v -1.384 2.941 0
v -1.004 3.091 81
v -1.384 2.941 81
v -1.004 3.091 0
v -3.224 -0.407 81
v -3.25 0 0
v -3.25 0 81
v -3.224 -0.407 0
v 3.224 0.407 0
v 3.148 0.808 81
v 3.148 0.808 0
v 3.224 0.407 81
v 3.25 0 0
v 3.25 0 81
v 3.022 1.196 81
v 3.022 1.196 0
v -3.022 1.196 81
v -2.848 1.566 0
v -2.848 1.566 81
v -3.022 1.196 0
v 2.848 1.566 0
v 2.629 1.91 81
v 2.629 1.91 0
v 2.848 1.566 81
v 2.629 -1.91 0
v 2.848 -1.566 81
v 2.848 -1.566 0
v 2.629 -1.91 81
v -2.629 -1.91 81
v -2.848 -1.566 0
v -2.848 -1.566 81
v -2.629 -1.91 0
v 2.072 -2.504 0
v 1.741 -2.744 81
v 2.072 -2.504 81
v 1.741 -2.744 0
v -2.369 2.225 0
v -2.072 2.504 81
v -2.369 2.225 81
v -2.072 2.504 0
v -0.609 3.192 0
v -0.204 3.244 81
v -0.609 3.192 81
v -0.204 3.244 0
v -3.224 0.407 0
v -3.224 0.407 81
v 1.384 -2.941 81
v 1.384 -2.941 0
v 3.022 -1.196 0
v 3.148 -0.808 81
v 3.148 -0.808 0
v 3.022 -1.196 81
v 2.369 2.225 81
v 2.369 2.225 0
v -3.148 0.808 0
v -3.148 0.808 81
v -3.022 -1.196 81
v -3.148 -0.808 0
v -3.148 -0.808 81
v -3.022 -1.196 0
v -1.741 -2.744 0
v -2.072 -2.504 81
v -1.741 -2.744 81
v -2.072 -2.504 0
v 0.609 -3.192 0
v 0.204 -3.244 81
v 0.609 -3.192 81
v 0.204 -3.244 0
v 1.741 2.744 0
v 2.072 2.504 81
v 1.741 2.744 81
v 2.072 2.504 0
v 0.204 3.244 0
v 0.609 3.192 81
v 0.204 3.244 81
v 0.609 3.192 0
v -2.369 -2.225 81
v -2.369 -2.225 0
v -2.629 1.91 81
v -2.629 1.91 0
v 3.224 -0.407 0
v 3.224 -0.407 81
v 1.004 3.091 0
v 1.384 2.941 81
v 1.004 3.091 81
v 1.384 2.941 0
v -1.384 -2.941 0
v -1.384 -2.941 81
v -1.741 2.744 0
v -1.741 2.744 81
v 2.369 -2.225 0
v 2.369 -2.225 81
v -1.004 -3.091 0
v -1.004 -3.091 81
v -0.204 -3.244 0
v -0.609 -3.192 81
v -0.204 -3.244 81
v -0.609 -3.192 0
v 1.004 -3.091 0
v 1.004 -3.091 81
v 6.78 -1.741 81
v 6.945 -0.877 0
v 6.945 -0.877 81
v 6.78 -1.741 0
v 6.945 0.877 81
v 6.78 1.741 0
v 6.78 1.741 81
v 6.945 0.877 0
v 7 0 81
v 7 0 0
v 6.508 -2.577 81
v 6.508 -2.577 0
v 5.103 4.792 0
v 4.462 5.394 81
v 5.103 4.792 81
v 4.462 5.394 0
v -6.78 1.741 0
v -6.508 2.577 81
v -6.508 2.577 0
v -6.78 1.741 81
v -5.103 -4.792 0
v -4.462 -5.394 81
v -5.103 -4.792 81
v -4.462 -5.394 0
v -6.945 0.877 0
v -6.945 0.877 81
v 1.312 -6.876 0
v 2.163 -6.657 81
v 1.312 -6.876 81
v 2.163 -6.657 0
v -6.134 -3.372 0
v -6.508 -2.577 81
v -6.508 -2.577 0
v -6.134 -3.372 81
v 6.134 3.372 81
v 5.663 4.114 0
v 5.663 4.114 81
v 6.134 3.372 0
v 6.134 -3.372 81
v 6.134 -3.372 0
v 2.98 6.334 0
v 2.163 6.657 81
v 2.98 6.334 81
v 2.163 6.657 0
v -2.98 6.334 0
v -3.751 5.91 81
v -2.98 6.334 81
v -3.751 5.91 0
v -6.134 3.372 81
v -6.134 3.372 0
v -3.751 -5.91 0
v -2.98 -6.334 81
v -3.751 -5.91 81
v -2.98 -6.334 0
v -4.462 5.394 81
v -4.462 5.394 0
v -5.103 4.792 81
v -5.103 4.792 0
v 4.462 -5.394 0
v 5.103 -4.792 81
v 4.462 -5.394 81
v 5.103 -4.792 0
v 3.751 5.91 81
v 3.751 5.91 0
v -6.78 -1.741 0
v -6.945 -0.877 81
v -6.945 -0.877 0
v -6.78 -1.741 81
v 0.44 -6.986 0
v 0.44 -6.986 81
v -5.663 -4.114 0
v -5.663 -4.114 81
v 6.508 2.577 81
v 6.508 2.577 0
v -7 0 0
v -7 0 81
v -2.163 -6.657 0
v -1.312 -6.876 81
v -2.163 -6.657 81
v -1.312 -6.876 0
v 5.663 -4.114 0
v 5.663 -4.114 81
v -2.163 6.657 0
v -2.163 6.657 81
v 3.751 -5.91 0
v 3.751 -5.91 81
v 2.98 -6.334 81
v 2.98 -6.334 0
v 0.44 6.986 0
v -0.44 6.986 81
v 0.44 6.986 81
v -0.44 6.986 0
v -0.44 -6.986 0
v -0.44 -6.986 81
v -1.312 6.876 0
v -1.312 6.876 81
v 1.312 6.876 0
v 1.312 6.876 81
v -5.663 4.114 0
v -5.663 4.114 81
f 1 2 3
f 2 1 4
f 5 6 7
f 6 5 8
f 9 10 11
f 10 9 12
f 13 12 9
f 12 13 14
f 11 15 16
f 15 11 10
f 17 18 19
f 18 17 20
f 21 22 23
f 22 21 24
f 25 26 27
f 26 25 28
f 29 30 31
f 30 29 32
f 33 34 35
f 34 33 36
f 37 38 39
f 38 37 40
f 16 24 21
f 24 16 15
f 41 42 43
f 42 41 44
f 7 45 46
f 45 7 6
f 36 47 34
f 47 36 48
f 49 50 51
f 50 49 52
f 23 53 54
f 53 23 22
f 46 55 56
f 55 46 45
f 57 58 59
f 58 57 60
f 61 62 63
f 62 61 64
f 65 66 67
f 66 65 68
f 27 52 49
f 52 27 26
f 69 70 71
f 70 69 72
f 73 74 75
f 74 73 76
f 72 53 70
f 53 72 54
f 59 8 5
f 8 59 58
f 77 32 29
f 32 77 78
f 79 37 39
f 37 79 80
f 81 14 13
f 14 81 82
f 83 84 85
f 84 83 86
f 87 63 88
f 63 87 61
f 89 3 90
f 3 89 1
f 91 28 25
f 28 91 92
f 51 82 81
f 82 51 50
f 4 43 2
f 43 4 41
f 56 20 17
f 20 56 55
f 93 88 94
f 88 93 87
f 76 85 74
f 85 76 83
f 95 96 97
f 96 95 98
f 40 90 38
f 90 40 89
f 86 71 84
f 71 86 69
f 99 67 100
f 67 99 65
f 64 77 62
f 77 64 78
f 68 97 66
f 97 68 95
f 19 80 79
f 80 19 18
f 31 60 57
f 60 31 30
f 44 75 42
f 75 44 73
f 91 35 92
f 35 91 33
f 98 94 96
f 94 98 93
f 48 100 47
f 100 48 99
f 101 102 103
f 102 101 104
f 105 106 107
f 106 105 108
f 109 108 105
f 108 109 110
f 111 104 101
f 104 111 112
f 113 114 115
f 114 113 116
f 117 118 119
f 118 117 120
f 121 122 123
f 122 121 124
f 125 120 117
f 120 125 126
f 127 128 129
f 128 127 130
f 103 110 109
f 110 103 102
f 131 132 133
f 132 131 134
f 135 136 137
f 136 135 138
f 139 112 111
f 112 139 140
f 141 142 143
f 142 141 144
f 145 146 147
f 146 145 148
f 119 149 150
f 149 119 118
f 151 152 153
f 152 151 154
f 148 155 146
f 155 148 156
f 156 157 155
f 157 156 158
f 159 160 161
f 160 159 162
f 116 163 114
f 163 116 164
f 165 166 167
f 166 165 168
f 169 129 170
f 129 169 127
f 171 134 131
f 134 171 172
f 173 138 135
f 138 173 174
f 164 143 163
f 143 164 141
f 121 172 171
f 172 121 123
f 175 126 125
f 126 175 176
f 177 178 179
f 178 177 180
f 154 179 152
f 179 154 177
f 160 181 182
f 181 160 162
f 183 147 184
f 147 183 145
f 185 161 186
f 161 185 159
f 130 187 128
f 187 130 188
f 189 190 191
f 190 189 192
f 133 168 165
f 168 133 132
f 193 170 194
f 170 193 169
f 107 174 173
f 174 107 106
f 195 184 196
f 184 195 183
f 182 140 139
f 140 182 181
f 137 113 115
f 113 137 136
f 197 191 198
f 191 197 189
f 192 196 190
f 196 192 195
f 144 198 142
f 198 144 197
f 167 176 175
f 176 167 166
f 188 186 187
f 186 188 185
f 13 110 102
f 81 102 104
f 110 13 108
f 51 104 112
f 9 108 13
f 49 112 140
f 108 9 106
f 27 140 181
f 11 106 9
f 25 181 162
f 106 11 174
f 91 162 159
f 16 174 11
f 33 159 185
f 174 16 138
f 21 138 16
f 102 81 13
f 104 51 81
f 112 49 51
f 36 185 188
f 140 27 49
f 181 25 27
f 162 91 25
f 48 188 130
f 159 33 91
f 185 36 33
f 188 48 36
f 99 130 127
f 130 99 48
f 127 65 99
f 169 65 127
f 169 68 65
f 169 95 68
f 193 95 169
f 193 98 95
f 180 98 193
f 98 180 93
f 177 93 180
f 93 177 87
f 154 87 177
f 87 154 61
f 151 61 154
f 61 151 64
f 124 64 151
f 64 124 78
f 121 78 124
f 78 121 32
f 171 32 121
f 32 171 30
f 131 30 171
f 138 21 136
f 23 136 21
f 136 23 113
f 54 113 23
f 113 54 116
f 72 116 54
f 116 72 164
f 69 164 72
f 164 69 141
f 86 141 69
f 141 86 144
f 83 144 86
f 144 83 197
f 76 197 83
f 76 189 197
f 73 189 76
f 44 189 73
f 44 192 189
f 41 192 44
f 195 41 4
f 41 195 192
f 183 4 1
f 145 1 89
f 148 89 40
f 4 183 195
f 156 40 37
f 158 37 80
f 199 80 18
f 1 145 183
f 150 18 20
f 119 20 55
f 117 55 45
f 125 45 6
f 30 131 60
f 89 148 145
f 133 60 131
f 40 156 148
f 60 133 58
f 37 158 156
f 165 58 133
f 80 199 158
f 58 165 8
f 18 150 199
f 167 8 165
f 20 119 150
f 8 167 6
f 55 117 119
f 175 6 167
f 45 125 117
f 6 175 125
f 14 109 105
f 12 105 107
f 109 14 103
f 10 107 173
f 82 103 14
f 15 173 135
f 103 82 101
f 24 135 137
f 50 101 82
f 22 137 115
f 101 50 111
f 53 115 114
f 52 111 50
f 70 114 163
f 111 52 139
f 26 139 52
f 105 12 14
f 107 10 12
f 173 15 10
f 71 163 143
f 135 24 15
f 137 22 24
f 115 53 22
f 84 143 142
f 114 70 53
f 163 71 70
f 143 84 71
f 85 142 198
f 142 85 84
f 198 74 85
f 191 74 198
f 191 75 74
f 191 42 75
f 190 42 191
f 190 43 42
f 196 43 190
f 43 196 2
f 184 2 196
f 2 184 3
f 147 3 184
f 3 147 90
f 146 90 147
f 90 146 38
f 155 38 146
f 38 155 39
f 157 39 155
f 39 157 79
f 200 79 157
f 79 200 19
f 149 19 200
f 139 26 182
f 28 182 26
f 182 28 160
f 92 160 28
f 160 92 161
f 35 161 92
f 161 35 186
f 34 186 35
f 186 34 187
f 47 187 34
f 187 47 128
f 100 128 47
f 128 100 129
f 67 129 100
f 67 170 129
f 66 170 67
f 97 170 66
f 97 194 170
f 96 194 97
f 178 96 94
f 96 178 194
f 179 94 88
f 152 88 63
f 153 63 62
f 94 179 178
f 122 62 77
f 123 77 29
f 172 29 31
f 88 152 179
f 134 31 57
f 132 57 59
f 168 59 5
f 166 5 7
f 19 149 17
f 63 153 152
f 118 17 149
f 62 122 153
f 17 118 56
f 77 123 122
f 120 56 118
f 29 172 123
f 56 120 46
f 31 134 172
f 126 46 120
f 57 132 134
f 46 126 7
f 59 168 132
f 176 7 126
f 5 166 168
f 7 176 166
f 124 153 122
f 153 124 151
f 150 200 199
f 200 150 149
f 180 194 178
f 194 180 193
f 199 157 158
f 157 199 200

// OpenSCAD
$fn = 50;


difference() {
	union() {
		cylinder(h = 81, r = 7.0000000000);
	}
	union() {
		translate(v = [0.0000000000, 0.0000000000, -100.0000000000]) {
			cylinder(h = 200, r = 3.2500000000);
		}
		translate(v = [0.0000000000, 0.0000000000, -100.0000000000]) {
			cylinder(h = 200, r = 3.2500000000);
		}
		translate(v = [0.0000000000, 0.0000000000, -100.0000000000]) {
			cylinder(h = 200, r = 3.2500000000);
		}
		translate(v = [0.0000000000, 0.0000000000, -100.0000000000]) {
			cylinder(h = 200, r = 3.2500000000);
		}
	}
}
